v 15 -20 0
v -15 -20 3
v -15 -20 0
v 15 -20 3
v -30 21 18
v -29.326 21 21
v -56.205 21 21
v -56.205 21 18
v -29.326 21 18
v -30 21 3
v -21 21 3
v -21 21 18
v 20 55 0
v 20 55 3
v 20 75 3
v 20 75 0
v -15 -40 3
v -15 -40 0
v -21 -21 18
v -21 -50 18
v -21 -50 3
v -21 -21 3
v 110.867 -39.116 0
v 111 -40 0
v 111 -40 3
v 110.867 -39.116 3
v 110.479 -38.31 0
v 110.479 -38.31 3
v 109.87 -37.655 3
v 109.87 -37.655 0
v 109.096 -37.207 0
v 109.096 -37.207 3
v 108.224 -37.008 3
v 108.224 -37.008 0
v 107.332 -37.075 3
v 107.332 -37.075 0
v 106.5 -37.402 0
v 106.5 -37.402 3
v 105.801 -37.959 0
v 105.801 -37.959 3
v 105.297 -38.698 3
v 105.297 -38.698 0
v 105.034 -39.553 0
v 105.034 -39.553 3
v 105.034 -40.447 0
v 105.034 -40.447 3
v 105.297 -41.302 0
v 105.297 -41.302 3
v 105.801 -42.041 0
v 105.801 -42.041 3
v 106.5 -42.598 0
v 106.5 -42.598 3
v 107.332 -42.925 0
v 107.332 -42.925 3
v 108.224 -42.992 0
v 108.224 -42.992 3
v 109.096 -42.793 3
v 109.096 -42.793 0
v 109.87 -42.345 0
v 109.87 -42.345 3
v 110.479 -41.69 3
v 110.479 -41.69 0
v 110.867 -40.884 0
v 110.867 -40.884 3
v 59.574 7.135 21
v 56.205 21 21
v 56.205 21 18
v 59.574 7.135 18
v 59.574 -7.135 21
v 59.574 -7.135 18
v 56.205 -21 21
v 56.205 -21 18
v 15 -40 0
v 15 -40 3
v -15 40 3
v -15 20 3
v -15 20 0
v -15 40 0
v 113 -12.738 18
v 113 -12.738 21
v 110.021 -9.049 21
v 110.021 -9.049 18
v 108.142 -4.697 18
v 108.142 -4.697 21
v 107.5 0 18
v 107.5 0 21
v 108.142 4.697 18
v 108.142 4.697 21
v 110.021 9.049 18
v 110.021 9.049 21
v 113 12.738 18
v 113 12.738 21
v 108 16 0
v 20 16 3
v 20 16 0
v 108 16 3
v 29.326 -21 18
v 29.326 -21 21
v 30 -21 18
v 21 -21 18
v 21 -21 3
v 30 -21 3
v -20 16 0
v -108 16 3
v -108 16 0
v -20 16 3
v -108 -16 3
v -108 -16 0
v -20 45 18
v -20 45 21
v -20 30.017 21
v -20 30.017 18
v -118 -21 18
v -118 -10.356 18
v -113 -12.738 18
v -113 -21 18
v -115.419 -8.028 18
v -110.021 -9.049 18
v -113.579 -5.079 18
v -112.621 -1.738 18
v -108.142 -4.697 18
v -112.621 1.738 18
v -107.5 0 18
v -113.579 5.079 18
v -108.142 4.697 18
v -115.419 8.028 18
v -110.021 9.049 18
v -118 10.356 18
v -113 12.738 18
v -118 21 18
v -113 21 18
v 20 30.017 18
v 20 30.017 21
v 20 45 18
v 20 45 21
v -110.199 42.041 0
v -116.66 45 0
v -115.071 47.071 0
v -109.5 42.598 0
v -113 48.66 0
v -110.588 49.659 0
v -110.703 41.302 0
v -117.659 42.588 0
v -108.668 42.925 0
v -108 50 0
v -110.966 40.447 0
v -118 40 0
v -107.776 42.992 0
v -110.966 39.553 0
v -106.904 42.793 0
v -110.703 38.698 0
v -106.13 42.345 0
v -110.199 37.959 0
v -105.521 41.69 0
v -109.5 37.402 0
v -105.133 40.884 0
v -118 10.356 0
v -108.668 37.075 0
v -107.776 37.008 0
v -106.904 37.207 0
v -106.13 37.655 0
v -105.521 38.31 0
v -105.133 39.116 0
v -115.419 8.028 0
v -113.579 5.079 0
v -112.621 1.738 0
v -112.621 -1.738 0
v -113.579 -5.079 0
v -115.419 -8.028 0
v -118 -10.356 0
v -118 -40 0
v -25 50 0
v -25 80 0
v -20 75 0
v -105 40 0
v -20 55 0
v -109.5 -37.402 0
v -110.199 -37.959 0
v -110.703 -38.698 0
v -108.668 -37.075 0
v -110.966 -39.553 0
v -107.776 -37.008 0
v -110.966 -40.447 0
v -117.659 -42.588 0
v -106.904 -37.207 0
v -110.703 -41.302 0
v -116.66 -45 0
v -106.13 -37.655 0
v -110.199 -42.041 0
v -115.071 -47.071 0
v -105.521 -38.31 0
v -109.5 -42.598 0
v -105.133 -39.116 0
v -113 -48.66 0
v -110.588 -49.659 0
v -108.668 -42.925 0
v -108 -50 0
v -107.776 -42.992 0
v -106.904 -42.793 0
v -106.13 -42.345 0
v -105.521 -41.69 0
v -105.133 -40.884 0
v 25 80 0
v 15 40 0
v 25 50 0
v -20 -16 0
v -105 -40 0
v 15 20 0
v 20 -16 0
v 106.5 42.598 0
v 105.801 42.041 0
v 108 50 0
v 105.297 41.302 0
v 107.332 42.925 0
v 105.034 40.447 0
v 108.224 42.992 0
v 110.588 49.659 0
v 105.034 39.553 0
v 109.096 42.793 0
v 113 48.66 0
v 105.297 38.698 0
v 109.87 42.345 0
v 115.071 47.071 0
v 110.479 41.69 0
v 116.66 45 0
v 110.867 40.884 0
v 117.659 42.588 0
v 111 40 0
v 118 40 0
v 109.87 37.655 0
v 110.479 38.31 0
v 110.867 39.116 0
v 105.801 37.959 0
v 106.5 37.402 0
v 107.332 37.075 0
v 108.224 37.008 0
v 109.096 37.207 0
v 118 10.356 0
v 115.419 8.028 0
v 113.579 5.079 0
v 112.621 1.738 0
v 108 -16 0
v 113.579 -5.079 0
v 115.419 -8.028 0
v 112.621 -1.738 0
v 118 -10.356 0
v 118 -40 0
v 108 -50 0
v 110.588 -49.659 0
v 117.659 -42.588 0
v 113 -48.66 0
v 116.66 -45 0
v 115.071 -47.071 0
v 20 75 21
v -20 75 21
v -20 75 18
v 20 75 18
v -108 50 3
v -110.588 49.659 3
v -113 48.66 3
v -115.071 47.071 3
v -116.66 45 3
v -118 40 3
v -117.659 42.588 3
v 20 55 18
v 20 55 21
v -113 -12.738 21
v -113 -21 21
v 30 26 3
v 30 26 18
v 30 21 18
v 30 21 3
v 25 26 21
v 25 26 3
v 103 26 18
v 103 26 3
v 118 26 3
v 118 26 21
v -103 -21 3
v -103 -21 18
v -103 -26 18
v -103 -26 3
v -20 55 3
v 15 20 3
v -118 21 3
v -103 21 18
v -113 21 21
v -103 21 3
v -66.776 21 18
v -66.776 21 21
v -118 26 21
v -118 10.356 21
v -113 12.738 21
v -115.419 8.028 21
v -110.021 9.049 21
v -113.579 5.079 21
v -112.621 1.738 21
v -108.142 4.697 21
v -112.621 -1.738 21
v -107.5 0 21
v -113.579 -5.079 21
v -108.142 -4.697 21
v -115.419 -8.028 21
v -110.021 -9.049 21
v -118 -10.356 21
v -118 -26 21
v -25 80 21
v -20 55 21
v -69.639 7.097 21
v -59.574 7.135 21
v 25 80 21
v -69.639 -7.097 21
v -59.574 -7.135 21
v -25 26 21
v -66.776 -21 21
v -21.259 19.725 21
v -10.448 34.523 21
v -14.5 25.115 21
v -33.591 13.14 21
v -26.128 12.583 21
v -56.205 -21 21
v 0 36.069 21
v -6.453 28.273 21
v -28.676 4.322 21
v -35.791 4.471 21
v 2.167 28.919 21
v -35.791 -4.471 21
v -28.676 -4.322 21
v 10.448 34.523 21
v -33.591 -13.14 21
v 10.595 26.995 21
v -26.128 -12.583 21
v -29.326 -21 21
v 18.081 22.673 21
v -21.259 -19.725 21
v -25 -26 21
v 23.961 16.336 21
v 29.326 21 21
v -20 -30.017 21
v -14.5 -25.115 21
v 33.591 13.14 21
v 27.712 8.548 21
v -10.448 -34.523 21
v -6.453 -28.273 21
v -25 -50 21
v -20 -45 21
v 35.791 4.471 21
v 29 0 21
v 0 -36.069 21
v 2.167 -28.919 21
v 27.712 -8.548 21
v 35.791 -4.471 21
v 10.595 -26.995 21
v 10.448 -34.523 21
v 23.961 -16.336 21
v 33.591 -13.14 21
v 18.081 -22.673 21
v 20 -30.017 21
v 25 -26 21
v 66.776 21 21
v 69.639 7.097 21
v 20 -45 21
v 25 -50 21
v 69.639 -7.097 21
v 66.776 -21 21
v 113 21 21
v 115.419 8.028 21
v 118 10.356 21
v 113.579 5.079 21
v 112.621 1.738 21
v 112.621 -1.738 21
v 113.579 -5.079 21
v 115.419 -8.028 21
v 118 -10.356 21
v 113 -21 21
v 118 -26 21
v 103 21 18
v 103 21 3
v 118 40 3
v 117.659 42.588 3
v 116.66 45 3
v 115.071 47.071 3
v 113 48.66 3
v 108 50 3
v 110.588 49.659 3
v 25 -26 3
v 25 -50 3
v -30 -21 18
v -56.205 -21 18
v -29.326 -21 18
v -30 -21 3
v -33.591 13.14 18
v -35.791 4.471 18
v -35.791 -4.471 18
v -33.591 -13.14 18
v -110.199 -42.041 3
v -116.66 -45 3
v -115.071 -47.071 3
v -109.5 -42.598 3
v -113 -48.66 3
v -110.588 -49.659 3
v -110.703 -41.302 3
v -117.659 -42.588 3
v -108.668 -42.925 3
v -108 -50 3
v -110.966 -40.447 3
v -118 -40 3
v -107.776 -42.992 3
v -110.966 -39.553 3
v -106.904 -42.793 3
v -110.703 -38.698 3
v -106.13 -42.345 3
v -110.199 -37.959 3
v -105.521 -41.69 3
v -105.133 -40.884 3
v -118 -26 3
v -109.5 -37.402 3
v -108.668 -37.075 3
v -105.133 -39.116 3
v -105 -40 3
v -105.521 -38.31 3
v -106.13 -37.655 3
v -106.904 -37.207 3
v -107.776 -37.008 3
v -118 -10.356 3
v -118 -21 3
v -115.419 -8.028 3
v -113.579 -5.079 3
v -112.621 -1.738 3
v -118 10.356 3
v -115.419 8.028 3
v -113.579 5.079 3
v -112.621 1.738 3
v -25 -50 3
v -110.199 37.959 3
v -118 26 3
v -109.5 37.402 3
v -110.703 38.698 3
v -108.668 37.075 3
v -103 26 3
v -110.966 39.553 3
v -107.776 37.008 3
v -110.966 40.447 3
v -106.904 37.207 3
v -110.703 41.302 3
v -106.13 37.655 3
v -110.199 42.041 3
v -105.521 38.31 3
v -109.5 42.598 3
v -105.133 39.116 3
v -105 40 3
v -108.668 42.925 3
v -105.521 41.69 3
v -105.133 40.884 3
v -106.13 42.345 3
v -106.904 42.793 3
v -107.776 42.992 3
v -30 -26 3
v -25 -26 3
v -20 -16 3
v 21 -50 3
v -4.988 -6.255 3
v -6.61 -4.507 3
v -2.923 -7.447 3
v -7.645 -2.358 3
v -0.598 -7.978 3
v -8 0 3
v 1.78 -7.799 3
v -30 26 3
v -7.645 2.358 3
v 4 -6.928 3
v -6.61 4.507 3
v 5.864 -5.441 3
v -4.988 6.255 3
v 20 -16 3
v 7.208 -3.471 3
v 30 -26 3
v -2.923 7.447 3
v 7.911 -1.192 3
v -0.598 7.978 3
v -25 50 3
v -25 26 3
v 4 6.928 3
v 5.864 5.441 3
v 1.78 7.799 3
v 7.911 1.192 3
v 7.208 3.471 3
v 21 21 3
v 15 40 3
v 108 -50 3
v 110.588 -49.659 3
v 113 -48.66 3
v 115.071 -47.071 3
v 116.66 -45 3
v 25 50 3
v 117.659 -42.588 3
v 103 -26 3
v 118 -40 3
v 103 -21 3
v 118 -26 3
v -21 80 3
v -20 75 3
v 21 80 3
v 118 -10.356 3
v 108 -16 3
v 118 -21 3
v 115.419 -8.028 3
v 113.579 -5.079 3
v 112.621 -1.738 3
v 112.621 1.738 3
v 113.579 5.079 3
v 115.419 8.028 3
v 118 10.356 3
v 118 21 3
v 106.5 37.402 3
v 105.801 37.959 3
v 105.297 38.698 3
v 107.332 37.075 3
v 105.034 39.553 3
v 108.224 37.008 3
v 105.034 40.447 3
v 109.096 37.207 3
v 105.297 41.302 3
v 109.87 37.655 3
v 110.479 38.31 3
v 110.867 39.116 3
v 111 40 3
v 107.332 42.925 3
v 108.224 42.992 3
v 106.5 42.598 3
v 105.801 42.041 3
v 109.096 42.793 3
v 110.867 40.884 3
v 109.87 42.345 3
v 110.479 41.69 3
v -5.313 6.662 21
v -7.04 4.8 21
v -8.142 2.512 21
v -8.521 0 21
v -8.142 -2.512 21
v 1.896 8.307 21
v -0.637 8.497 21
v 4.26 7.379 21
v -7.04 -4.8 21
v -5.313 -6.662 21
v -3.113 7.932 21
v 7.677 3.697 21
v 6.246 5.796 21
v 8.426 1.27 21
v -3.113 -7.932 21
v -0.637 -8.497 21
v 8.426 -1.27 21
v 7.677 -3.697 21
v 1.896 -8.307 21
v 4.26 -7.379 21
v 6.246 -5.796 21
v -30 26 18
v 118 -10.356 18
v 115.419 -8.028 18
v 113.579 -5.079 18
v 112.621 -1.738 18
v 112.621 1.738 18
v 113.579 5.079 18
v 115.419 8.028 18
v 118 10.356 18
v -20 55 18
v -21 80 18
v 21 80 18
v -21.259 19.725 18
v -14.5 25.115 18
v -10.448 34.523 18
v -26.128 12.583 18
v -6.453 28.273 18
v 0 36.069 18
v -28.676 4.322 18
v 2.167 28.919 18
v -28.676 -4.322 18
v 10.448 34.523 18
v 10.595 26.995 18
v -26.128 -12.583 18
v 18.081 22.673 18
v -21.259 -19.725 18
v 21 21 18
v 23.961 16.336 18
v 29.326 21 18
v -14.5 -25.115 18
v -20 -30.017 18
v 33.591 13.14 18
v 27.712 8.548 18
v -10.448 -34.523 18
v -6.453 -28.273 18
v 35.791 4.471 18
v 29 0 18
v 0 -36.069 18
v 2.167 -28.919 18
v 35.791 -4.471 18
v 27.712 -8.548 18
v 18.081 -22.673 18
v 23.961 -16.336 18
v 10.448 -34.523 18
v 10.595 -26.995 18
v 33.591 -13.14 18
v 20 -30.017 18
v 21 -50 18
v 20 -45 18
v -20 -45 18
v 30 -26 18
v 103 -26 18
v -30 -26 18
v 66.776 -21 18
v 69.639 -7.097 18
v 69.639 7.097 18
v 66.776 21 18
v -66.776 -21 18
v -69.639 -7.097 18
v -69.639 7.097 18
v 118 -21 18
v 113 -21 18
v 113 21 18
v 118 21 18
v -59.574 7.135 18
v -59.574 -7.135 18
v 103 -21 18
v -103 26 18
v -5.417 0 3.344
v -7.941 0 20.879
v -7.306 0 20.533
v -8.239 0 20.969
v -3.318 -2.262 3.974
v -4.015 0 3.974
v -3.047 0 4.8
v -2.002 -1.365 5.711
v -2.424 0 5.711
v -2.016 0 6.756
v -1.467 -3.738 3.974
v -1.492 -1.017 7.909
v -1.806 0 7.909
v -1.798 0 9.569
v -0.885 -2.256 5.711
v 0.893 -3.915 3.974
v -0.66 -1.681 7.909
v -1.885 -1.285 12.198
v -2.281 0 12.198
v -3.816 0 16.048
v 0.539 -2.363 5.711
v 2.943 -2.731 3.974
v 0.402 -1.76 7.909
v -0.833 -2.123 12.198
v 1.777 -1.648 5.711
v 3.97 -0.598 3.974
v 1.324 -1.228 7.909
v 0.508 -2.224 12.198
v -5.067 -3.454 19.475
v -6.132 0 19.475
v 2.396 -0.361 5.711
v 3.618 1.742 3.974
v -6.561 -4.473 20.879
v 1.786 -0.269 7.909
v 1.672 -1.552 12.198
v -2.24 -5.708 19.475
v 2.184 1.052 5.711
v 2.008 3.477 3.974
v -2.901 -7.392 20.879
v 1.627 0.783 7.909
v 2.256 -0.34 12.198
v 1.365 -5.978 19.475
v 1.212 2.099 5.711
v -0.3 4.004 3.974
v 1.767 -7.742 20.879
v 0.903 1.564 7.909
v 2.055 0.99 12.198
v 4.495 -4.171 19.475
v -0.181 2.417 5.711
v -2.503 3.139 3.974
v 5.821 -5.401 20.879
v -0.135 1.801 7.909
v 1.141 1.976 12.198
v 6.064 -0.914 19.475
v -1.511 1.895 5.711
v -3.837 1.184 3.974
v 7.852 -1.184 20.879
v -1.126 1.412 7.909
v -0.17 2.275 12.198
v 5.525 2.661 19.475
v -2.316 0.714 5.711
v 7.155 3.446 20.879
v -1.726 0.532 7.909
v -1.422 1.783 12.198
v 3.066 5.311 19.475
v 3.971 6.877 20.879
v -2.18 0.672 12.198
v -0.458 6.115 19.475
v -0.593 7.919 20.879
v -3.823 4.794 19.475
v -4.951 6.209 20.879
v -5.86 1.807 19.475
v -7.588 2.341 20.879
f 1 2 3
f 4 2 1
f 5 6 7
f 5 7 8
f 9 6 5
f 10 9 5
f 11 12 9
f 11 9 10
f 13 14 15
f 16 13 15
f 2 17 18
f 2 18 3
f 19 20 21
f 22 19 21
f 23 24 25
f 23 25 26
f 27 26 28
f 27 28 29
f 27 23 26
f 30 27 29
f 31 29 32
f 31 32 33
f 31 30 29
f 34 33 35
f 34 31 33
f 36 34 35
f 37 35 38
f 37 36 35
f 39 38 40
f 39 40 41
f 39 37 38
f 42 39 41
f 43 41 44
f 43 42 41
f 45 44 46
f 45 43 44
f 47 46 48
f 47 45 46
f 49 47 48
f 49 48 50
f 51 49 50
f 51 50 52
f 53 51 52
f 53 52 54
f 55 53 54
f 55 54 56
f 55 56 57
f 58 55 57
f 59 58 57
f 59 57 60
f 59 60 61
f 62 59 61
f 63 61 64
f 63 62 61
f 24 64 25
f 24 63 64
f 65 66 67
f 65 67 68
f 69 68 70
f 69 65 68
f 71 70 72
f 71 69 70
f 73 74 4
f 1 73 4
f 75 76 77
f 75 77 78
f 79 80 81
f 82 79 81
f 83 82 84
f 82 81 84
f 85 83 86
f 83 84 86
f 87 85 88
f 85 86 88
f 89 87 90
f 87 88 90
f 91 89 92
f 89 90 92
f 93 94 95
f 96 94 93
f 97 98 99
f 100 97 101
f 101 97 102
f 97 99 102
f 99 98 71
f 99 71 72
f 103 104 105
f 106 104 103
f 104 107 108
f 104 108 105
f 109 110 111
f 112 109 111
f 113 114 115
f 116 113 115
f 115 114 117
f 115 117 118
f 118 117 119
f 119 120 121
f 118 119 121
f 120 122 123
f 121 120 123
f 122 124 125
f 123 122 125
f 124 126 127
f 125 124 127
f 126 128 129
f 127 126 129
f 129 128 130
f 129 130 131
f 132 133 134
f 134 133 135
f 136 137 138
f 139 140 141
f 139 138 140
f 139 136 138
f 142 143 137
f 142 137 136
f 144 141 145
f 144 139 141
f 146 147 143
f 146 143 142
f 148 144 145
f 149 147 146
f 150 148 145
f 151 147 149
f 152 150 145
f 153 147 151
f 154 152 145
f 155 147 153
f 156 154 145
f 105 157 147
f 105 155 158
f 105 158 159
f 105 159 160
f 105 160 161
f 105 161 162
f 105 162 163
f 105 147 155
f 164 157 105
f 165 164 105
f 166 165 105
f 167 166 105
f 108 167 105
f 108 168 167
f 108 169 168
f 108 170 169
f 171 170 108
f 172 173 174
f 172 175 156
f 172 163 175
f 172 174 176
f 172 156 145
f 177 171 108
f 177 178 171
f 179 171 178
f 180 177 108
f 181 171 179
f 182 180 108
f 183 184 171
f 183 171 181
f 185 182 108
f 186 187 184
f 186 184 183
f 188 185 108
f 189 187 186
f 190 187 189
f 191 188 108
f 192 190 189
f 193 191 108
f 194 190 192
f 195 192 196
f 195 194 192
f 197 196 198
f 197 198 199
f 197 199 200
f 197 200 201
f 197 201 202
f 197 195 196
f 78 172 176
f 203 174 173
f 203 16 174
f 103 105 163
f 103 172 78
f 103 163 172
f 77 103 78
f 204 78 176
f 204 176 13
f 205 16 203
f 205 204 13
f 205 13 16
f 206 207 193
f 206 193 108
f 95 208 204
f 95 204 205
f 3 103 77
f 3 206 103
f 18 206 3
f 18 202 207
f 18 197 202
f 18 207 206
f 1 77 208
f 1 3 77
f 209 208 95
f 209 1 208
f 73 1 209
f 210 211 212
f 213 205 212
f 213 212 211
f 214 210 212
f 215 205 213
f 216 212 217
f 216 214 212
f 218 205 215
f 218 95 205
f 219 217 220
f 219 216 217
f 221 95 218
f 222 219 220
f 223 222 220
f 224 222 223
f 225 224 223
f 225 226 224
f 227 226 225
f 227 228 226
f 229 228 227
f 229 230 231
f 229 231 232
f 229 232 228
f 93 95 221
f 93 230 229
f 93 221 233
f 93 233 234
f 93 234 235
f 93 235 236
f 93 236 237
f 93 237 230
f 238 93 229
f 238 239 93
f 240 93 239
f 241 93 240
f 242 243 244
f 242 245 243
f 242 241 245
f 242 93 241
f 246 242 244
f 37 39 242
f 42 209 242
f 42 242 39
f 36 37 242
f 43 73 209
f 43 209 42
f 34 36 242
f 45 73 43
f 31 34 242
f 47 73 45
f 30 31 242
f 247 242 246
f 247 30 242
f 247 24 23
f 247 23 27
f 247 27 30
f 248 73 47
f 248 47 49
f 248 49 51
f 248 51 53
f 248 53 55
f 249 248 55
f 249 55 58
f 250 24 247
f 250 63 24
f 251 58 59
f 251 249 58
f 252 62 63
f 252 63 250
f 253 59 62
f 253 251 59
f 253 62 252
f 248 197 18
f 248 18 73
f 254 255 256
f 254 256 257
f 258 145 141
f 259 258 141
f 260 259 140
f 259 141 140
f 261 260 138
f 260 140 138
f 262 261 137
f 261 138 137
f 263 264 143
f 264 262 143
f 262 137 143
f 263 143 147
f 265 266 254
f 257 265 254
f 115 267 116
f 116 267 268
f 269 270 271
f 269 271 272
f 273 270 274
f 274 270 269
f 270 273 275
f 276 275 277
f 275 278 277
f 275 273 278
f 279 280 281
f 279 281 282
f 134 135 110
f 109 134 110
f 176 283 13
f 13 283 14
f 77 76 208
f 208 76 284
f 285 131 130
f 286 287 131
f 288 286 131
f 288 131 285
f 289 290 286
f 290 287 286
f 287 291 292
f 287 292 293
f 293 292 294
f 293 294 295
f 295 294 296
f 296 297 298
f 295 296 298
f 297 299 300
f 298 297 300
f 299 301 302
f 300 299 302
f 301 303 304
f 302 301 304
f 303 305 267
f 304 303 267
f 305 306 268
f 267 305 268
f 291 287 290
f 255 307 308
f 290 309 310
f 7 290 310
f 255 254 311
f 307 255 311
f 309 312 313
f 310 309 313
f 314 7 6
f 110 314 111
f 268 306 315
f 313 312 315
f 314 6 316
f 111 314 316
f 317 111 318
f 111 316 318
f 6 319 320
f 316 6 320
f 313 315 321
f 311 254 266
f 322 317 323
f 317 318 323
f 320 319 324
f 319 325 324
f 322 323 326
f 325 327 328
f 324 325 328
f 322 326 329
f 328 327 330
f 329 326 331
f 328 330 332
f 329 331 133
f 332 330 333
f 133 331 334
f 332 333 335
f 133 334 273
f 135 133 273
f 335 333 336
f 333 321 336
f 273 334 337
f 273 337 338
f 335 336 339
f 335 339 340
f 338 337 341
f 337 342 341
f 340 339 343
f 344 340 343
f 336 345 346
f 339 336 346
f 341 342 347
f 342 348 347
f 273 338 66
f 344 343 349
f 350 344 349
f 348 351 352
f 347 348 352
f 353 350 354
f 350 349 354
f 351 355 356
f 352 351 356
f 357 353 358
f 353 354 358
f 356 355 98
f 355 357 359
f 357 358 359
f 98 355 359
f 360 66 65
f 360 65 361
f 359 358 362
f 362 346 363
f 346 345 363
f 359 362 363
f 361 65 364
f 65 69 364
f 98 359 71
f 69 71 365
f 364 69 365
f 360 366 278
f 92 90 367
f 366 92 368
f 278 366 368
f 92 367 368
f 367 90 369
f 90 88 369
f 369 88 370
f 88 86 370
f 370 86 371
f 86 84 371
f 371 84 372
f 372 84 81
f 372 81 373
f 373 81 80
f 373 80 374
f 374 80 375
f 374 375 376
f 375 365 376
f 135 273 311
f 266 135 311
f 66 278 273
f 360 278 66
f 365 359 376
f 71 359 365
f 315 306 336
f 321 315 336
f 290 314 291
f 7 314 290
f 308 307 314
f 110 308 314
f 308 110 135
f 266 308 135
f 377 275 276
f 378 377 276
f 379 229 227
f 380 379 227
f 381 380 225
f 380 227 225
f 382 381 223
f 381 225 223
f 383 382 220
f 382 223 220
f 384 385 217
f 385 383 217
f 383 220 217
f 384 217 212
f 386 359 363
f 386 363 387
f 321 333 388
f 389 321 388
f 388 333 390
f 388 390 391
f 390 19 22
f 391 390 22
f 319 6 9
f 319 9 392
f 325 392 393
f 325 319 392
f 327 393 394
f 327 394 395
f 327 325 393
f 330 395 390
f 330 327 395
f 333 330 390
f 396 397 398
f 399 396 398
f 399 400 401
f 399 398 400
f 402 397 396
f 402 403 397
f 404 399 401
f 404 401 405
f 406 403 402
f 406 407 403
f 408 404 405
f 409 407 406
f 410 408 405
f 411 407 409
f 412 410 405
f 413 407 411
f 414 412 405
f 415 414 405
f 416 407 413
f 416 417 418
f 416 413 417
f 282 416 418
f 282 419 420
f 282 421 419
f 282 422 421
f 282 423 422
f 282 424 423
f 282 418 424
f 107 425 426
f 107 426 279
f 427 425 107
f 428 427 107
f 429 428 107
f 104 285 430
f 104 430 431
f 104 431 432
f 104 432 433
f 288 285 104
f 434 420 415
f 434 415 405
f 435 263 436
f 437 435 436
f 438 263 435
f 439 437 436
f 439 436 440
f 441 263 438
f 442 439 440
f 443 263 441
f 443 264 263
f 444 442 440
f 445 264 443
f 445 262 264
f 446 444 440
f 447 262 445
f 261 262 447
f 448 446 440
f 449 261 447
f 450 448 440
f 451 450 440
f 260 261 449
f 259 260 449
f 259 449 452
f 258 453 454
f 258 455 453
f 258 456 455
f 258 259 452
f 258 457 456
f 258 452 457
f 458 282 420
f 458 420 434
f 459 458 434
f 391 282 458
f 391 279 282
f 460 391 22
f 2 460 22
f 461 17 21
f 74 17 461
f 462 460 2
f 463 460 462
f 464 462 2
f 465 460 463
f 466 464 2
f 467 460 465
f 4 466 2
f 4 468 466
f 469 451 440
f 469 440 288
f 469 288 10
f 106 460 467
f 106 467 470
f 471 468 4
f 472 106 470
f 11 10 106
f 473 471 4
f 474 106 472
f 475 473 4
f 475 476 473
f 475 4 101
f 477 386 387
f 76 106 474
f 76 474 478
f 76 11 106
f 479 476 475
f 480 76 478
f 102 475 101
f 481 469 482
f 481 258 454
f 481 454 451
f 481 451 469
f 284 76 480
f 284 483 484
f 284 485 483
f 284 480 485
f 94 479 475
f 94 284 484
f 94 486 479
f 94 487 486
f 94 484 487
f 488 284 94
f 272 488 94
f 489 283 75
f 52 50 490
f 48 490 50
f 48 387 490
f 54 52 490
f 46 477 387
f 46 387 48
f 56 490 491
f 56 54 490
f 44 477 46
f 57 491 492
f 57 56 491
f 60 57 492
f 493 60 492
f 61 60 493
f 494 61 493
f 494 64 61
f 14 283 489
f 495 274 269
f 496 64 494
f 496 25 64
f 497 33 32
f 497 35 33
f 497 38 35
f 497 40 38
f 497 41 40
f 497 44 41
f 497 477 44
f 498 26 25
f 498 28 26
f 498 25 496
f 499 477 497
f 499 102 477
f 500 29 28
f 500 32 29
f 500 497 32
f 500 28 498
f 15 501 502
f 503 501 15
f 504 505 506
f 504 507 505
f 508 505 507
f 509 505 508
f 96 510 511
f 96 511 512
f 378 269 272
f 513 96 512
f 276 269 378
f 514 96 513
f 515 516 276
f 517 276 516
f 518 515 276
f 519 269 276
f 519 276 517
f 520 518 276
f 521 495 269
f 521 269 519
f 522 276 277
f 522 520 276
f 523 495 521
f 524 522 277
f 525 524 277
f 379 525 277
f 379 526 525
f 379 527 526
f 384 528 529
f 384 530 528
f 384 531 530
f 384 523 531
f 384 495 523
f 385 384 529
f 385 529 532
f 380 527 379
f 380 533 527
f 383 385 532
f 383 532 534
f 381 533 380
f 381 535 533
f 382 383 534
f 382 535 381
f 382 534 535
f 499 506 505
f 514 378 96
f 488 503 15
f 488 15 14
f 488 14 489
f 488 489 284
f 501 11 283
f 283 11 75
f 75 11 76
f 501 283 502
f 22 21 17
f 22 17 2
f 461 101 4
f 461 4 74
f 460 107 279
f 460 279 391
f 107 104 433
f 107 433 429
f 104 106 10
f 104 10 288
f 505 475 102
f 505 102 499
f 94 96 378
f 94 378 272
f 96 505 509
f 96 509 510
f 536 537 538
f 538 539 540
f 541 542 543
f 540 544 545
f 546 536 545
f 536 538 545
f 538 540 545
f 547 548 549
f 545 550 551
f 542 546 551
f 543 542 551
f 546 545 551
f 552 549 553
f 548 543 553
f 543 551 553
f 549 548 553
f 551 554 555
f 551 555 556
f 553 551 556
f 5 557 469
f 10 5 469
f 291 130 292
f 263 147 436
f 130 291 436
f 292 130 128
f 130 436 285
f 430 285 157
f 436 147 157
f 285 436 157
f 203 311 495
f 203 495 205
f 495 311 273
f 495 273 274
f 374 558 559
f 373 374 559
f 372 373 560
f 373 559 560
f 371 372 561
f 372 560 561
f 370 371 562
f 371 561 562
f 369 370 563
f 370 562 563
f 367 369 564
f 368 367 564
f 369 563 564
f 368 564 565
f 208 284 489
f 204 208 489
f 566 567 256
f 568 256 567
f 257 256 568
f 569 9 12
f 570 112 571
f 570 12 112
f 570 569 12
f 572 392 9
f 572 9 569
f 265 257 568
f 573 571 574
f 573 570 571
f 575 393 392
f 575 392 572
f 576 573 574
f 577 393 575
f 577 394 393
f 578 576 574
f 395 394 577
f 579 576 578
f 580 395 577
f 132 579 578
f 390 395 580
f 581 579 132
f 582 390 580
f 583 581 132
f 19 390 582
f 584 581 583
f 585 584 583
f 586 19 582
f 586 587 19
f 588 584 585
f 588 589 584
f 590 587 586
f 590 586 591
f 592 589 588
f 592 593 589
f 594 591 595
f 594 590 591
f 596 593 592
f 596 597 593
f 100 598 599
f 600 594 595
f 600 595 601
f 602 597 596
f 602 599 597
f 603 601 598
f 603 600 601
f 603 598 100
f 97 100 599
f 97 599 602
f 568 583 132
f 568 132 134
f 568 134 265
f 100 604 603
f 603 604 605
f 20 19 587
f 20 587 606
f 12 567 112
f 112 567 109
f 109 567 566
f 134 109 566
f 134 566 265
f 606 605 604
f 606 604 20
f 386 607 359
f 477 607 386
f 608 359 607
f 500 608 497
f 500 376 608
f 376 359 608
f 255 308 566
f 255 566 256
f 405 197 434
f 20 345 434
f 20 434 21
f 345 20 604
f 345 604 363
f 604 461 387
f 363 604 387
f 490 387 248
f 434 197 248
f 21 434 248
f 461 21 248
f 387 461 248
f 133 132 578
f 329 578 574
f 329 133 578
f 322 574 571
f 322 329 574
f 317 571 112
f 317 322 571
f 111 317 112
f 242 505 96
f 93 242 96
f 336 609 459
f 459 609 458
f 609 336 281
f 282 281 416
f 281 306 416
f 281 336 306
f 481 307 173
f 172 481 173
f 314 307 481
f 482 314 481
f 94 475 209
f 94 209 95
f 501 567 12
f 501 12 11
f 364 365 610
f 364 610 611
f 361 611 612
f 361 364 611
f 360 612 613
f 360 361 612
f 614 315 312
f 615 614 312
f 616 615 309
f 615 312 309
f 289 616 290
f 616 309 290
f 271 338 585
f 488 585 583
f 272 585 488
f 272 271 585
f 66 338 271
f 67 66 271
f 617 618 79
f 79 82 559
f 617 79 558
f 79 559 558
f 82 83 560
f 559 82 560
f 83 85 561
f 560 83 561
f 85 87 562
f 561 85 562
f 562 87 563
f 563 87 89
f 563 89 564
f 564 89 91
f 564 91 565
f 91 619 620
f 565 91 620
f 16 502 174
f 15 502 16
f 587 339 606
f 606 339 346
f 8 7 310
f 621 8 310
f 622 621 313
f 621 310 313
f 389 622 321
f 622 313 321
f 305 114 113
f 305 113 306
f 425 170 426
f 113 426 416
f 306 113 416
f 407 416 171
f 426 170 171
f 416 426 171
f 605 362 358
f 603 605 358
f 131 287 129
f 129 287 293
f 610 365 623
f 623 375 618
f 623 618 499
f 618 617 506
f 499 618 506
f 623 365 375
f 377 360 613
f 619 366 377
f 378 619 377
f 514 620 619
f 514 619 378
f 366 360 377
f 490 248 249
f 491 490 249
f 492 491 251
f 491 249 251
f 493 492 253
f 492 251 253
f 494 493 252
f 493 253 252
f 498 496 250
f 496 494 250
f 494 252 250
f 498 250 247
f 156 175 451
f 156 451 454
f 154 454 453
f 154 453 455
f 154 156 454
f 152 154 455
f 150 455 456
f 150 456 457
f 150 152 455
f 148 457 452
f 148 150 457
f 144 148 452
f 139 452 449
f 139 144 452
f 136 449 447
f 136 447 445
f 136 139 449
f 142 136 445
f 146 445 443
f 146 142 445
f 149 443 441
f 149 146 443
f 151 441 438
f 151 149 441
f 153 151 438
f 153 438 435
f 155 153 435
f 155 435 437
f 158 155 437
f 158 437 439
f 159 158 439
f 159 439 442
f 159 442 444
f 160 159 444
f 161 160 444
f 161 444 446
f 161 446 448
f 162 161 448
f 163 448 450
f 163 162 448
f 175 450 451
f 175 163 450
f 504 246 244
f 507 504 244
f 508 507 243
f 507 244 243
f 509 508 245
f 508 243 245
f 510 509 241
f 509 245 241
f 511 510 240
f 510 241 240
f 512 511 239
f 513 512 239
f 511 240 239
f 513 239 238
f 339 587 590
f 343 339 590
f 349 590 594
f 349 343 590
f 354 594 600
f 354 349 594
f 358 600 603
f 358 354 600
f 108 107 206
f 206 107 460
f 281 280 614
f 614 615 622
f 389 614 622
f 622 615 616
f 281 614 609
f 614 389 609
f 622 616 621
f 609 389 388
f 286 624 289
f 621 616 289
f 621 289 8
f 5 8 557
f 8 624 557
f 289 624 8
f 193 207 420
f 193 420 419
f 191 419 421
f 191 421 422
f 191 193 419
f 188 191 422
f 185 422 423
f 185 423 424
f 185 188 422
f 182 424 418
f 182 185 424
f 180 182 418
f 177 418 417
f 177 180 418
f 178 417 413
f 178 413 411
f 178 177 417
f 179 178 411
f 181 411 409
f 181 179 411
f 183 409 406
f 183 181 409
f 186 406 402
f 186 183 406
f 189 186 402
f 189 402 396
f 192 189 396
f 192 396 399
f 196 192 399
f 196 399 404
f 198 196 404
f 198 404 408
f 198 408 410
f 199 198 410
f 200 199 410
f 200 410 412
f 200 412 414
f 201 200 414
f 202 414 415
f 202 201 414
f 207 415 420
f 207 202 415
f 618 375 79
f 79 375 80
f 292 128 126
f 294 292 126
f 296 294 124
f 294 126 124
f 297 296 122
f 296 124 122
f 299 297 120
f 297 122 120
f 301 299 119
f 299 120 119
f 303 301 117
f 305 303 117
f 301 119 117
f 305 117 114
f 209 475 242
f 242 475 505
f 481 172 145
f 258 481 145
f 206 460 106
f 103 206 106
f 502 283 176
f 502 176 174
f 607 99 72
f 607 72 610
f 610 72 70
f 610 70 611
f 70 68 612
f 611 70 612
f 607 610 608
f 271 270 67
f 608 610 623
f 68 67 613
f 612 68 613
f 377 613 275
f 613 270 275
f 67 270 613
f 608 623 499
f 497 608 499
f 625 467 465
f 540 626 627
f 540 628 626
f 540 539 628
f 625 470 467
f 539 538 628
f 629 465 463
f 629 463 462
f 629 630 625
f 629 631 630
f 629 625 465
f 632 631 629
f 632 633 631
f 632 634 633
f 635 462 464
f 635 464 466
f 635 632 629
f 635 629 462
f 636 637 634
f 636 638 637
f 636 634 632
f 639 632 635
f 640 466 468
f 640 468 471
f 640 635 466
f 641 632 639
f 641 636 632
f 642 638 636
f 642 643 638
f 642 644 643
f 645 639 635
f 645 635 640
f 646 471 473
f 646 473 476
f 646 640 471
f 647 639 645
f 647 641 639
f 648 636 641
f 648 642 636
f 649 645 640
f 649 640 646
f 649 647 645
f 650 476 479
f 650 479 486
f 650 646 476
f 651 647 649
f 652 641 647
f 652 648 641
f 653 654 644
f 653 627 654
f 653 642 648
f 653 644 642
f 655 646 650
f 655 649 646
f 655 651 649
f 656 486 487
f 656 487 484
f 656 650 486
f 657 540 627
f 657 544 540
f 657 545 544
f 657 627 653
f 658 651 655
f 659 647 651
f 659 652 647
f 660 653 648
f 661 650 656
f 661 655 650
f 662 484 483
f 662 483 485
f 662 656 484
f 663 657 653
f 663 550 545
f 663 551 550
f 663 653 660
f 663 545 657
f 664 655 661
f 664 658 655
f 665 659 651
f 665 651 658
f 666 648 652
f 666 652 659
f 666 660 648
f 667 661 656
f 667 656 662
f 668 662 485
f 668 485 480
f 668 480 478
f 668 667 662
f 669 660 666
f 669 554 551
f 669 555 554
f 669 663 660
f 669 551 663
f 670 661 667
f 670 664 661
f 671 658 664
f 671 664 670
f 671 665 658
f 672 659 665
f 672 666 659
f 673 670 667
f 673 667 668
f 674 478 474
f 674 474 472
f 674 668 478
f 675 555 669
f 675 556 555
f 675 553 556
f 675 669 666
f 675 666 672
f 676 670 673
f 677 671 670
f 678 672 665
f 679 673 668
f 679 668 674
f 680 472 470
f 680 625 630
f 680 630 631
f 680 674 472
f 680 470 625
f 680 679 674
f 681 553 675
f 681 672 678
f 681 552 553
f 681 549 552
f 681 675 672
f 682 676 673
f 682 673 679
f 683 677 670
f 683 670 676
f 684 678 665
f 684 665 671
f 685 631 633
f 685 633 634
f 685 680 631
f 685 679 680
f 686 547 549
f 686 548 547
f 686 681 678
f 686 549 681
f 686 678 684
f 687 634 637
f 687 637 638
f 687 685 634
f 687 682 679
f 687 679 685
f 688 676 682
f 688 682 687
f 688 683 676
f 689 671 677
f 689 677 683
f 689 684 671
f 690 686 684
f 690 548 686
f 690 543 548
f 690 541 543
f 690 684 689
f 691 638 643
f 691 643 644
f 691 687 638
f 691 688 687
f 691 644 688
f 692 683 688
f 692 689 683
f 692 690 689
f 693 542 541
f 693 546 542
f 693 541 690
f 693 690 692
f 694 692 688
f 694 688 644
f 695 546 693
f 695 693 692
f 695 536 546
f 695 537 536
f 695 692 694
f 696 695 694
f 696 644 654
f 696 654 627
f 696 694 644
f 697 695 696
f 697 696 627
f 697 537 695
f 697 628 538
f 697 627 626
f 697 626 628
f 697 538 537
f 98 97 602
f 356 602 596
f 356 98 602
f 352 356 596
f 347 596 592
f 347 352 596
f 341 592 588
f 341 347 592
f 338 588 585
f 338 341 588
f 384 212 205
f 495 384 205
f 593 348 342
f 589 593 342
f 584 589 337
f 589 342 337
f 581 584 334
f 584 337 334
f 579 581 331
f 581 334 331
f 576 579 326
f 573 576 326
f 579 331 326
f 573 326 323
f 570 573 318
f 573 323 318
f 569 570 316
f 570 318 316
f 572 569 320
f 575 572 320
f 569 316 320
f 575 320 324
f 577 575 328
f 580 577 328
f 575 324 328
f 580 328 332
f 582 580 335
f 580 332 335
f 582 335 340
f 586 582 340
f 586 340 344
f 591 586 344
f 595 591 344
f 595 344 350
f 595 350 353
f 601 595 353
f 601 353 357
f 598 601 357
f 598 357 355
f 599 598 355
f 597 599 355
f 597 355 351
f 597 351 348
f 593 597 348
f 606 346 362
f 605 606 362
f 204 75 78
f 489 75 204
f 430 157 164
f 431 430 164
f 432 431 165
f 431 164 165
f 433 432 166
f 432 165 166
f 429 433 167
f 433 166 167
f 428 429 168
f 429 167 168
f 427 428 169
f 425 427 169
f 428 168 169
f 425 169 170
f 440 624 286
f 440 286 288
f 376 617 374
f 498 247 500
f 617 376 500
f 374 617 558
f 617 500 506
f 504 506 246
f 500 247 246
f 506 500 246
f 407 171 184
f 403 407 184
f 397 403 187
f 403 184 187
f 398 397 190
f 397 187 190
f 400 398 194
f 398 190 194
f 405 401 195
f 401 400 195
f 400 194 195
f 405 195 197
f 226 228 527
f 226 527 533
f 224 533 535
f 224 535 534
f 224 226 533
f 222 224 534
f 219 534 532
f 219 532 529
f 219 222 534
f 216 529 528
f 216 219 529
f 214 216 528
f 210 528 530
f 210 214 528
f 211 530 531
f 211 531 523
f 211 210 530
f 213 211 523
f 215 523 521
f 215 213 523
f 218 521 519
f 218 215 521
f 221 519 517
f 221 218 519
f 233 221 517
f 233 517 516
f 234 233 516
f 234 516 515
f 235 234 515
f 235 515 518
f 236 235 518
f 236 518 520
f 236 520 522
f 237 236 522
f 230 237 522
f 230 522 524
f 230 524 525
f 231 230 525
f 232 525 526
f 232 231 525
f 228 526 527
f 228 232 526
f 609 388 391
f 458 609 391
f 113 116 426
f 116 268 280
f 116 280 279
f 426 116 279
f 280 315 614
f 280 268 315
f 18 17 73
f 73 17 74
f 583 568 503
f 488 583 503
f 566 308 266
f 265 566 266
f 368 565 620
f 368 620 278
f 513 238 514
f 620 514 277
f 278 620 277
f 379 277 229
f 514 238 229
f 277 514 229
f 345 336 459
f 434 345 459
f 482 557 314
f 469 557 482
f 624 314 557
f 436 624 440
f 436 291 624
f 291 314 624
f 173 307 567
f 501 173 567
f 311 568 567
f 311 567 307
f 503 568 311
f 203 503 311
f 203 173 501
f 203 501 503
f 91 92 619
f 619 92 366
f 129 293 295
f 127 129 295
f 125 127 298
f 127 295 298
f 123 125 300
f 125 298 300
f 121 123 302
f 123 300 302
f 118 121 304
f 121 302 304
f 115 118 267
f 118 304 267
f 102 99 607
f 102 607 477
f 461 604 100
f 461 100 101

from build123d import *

# Parameters (mm, degrees)
EXTRUDE_1_OUTLINE_R   = 6
EXTRUDE_1_DEPTH       = 21
EXTRUDE_2_OUTLINE_R   = 6
EXTRUDE_2_OUTLINE_R_2 = 3
EXTRUDE_2_DEPTH       = 3
SKETCH_2_W            = 15
SKETCH_2_H            = 42
CUT_EXTRUDE_1_DEPTH   = 243.150779474
SKETCH_3_W            = 42
SKETCH_3_H            = 15
CUT_EXTRUDE_2_DEPTH   = 157.092921044
SKETCH_2_3_W          = 18
SKETCH_2_3_H          = 14
SKETCH_2_3_H_2        = 10
SKETCH_2_3_H_3        = 24
CUT_EXTRUDE_3_DEPTH   = 93
CUT_EXTRUDE_START     = -236
SKETCH_2_4_W          = 15
SKETCH_2_4_H          = 42
SKETCH_2_4_W_2        = 18
SKETCH_2_4_H_2        = 24
CUT_EXTRUDE_4_DEPTH   = 93
SKETCH_3_3_W          = 42
SKETCH_3_3_H          = 15
SKETCH_3_3_W_2        = 73
CUT_EXTRUDE_5_DEPTH   = 157.092921044
CUT_EXTRUDE_6_REACH   = 131.865
SKETCH_6_W            = 88
SKETCH_6_H            = 32
SKETCH_6_W_2          = 30
SKETCH_6_H_2          = 20
CUT_EXTRUDE_7_DEPTH   = 130.414064165
SKETCH_7_R            = 36.069377594
SKETCH_7_R_2          = 29
EXTRUDE_3_DEPTH       = 3
SKETCH_8_W            = 50
SKETCH_8_H            = 21
SKETCH_8_W_2          = 42
SKETCH_8_H_2          = 15
EXTRUDE_4_DEPTH       = 30
SKETCH_9_W            = 40
SKETCH_9_H            = 20
CUT_EXTRUDE_8_DEPTH   = 145.100659263


# Read off the part's stored shape, not the designer's step: 凸台-拉伸1, 凸台-拉伸2
with BuildPart() as part:
    # 凸台-拉伸1 outline → 凸台-拉伸1 (new body)
    with BuildSketch(Plane.XY):
        with BuildLine():
            ThreePointArc((118, 40), (115.071067812, 47.071067812), (108, 50))
            Line((108, 50), (-108, 50))
            ThreePointArc((-108, 50), (-115.071067812, 47.071067812), (-118, 40))
            Line((-118, 40), (-118, 10.356157589))
            ThreePointArc((-118, 10.356157589), (-112.5, 0), (-118, -10.356157589))
            Line((-118, -10.356157589), (-118, -40))
            ThreePointArc((-118, -40), (-115.071067812, -47.071067812), (-108, -50))
            Line((-108, -50), (108, -50))
            ThreePointArc((108, -50), (115.071067812, -47.071067812), (118, -40))
            Line((118, -40), (118, -10.356157589))
            ThreePointArc((118, -10.356157589), (112.5, 0), (118, 10.356157589))
            Line((118, 10.356157589), (118, 40))
        make_face()
        with Locations((-108, -40)):
            Circle(EXTRUDE_1_OUTLINE_R, mode=Mode.SUBTRACT)
        with Locations((108, -40)):
            Circle(EXTRUDE_1_OUTLINE_R, mode=Mode.SUBTRACT)
        with Locations((-108, 40)):
            Circle(EXTRUDE_1_OUTLINE_R, mode=Mode.SUBTRACT)
        with Locations((108, 40)):
            Circle(EXTRUDE_1_OUTLINE_R, mode=Mode.SUBTRACT)
    extrude(amount=EXTRUDE_1_DEPTH)

    # 凸台-拉伸2 outline → 凸台-拉伸2 (add)
    # profile 1 of 4: a face of its own
    with BuildSketch(Plane.XY):
        with Locations((108, -40)):
            Circle(EXTRUDE_2_OUTLINE_R)
        with Locations((108, -40)):
            Circle(EXTRUDE_2_OUTLINE_R_2, mode=Mode.SUBTRACT)
    # profile 2 of 4: a face of its own
    with BuildSketch(Plane.XY):
        with Locations((-108, 40)):
            Circle(EXTRUDE_2_OUTLINE_R)
        with Locations((-108, 40)):
            Circle(EXTRUDE_2_OUTLINE_R_2, mode=Mode.SUBTRACT)
    # profile 3 of 4: a face of its own
    with BuildSketch(Plane.XY):
        with Locations((-108, -40)):
            Circle(EXTRUDE_2_OUTLINE_R)
        with Locations((-108, -40)):
            Circle(EXTRUDE_2_OUTLINE_R_2, mode=Mode.SUBTRACT)
    # profile 4 of 4: a face of its own
    with BuildSketch(Plane.XY):
        with Locations((108, 40)):
            Circle(EXTRUDE_2_OUTLINE_R)
        with Locations((108, 40)):
            Circle(EXTRUDE_2_OUTLINE_R_2, mode=Mode.SUBTRACT)
    extrude(amount=EXTRUDE_2_DEPTH)

    # 草图2 → 切除-拉伸1 (cut, through all)
    with BuildSketch(Plane(origin=(118, 0, 0), x_dir=(0, 0, -1), z_dir=(1, 0, 0))):
        with Locations((-10.5, 0)):
            Rectangle(SKETCH_2_W, SKETCH_2_H)
    extrude(amount=-CUT_EXTRUDE_1_DEPTH, mode=Mode.SUBTRACT)

    # 草图3 → 切除-拉伸2 (cut, through all)
    with BuildSketch(Plane(origin=(0, 50, 0), x_dir=(1, 0, 0), z_dir=(0, 1, 0))):
        with Locations((0, -10.5)):
            Rectangle(SKETCH_3_W, SKETCH_3_H)
    extrude(amount=-CUT_EXTRUDE_2_DEPTH, mode=Mode.SUBTRACT)

    # 草图2<3> → 切除-拉伸3 (cut)
    with BuildSketch(Plane(origin=(118, 0, 0), x_dir=(0, 0, -1), z_dir=(1, 0, 0))):
        with Locations((-12, 33)):
            Rectangle(SKETCH_2_3_W, SKETCH_2_3_H)
        with Locations((-12, 45)):
            Rectangle(SKETCH_2_3_W, SKETCH_2_3_H_2)
        with Locations((-12, -38)):
            Rectangle(SKETCH_2_3_W, SKETCH_2_3_H_3)
    extrude(amount=-CUT_EXTRUDE_3_DEPTH, mode=Mode.SUBTRACT)

    # 草图2<4> → 切除-拉伸4 (cut)
    with BuildSketch(Plane(origin=(118, 0, 0), x_dir=(0, 0, -1), z_dir=(1, 0, 0)).offset(CUT_EXTRUDE_START)):
        with Locations((-10.5, 0)):
            Rectangle(SKETCH_2_4_W, SKETCH_2_4_H)
        with Locations((-12, -38)):
            Rectangle(SKETCH_2_4_W_2, SKETCH_2_4_H_2)
        with Locations((-12, 38)):
            Rectangle(SKETCH_2_4_W_2, SKETCH_2_4_H_2)
    extrude(amount=CUT_EXTRUDE_4_DEPTH, mode=Mode.SUBTRACT)

    # 草图3<3> → 切除-拉伸5 (cut, through all)
    with BuildSketch(Plane(origin=(0, 50, 0), x_dir=(1, 0, 0), z_dir=(0, 1, 0))):
        with Locations((0, -10.5)):
            Rectangle(SKETCH_3_3_W, SKETCH_3_3_H)
        with Locations((-66.5, -10.5)):
            Rectangle(SKETCH_3_3_W_2, SKETCH_3_3_H)
        with Locations((66.5, -10.5)):
            Rectangle(SKETCH_3_3_W_2, SKETCH_3_3_H)
    extrude(amount=-CUT_EXTRUDE_5_DEPTH, mode=Mode.SUBTRACT)

    # 草图4 → 切除-拉伸6 (cut, up to next)
    with BuildSketch(Plane.XY.offset(21), mode=Mode.PRIVATE) as cut_extrude_6_sk1:
        with BuildLine():
            Line((-113, -12.737739203), (-113, -21))
            Line((-113, -21), (-20, -21))
            Line((-20, -21), (-20, -45))
            Line((-20, -45), (20, -45))
            Line((20, -45), (20, -21))
            Line((20, -21), (113, -21))
            Line((113, -21), (113, -12.737739203))
            ThreePointArc((113, -12.737739203), (107.5, 0), (113, 12.737739203))
            Line((113, 12.737739203), (113, 21))
            Line((113, 21), (20, 21))
            Line((20, 21), (20, 45))
            Line((20, 45), (-20, 45))
            Line((-20, 45), (-20, 21))
            Line((-20, 21), (-113, 21))
            Line((-113, 21), (-113, 12.737739203))
            ThreePointArc((-113, 12.737739203), (-107.5, 0), (-113, -12.737739203))
        make_face()
    cut_extrude_6_tool1 = extrude(cut_extrude_6_sk1.sketch, amount=-CUT_EXTRUDE_6_REACH, mode=Mode.PRIVATE) & part.part
    add(cut_extrude_6_tool1.solids().sort_by_distance((0, 0, 21))[0], mode=Mode.SUBTRACT)

    # 草图5 → 旋转1 (revolve)
    with BuildSketch(Plane.XZ):
        with BuildLine():
            Line((-8, 3), (0, 3))
            Line((0, 3), (0, 21))
            Line((0, 21), (-8.520929424, 21))
            add(Edge.make_bspline(
                [(-8, 3), (4.290492331, 3.04061628), (-4.734637162, 21), (-8.520929424, 21)],
                knots=[0, 0, 0, 0, 1, 1, 1, 1], degree=3))
        make_face()
    revolve(axis=Axis((0, 0, 0), (0, 0, 1)))

    # 草图6 → 切除-拉伸7 (cut, through all)
    with BuildSketch(Plane.XY.offset(3)):
        with Locations((-64, 0)):
            Rectangle(SKETCH_6_W, SKETCH_6_H)
        with Locations((0, 30)):
            Rectangle(SKETCH_6_W_2, SKETCH_6_H_2)
        with Locations((64, 0)):
            Rectangle(SKETCH_6_W, SKETCH_6_H)
        with Locations((0, -30)):
            Rectangle(SKETCH_6_W_2, SKETCH_6_H_2)
    extrude(amount=-CUT_EXTRUDE_7_DEPTH, mode=Mode.SUBTRACT)

    # 草图7 → 凸台-拉伸3 (add)
    # profile 1 of 3: a face of its own
    with BuildSketch(Plane.XY.offset(21)):
        Circle(SKETCH_7_R)
        Circle(SKETCH_7_R_2, mode=Mode.SUBTRACT)
    # profile 2 of 3: a face of its own
    with BuildSketch(Plane.XY.offset(21)):
        with BuildLine():
            Line((-64.992307237, 26), (-54.074023338, 26))
            ThreePointArc((-54.074023338, 26), (-60, 0), (-54.074023338, -26))
            Line((-54.074023338, -26), (-64.992307237, -26))
            ThreePointArc((-64.992307237, -26), (-70, 0), (-64.992307237, 26))
        make_face()
    # profile 3 of 3: a face of its own
    with BuildSketch(Plane.XY.offset(21)):
        with BuildLine():
            Line((64.992307237, 26), (54.074023338, 26))
            ThreePointArc((54.074023338, 26), (60, 0), (54.074023338, -26))
            Line((54.074023338, -26), (64.992307237, -26))
            ThreePointArc((64.992307237, -26), (70, 0), (64.992307237, 26))
        make_face()
    extrude(amount=-EXTRUDE_3_DEPTH)

    # 草图8 → 凸台-拉伸4 (add)
    with BuildSketch(Plane(origin=(0, 50, 0), x_dir=(1, 0, 0), z_dir=(0, 1, 0))):
        with Locations((0, -10.5)):
            Rectangle(SKETCH_8_W, SKETCH_8_H)
        with Locations((0, -10.5)):
            Rectangle(SKETCH_8_W_2, SKETCH_8_H_2, mode=Mode.SUBTRACT)
    extrude(amount=EXTRUDE_4_DEPTH)

    # 草图9 → 切除-拉伸8 (cut, through all)
    with BuildSketch(Plane.XY.offset(21)):
        with Locations((0, 65)):
            Rectangle(SKETCH_9_W, SKETCH_9_H)
    extrude(amount=-CUT_EXTRUDE_8_DEPTH, mode=Mode.SUBTRACT)


solid = part.part
